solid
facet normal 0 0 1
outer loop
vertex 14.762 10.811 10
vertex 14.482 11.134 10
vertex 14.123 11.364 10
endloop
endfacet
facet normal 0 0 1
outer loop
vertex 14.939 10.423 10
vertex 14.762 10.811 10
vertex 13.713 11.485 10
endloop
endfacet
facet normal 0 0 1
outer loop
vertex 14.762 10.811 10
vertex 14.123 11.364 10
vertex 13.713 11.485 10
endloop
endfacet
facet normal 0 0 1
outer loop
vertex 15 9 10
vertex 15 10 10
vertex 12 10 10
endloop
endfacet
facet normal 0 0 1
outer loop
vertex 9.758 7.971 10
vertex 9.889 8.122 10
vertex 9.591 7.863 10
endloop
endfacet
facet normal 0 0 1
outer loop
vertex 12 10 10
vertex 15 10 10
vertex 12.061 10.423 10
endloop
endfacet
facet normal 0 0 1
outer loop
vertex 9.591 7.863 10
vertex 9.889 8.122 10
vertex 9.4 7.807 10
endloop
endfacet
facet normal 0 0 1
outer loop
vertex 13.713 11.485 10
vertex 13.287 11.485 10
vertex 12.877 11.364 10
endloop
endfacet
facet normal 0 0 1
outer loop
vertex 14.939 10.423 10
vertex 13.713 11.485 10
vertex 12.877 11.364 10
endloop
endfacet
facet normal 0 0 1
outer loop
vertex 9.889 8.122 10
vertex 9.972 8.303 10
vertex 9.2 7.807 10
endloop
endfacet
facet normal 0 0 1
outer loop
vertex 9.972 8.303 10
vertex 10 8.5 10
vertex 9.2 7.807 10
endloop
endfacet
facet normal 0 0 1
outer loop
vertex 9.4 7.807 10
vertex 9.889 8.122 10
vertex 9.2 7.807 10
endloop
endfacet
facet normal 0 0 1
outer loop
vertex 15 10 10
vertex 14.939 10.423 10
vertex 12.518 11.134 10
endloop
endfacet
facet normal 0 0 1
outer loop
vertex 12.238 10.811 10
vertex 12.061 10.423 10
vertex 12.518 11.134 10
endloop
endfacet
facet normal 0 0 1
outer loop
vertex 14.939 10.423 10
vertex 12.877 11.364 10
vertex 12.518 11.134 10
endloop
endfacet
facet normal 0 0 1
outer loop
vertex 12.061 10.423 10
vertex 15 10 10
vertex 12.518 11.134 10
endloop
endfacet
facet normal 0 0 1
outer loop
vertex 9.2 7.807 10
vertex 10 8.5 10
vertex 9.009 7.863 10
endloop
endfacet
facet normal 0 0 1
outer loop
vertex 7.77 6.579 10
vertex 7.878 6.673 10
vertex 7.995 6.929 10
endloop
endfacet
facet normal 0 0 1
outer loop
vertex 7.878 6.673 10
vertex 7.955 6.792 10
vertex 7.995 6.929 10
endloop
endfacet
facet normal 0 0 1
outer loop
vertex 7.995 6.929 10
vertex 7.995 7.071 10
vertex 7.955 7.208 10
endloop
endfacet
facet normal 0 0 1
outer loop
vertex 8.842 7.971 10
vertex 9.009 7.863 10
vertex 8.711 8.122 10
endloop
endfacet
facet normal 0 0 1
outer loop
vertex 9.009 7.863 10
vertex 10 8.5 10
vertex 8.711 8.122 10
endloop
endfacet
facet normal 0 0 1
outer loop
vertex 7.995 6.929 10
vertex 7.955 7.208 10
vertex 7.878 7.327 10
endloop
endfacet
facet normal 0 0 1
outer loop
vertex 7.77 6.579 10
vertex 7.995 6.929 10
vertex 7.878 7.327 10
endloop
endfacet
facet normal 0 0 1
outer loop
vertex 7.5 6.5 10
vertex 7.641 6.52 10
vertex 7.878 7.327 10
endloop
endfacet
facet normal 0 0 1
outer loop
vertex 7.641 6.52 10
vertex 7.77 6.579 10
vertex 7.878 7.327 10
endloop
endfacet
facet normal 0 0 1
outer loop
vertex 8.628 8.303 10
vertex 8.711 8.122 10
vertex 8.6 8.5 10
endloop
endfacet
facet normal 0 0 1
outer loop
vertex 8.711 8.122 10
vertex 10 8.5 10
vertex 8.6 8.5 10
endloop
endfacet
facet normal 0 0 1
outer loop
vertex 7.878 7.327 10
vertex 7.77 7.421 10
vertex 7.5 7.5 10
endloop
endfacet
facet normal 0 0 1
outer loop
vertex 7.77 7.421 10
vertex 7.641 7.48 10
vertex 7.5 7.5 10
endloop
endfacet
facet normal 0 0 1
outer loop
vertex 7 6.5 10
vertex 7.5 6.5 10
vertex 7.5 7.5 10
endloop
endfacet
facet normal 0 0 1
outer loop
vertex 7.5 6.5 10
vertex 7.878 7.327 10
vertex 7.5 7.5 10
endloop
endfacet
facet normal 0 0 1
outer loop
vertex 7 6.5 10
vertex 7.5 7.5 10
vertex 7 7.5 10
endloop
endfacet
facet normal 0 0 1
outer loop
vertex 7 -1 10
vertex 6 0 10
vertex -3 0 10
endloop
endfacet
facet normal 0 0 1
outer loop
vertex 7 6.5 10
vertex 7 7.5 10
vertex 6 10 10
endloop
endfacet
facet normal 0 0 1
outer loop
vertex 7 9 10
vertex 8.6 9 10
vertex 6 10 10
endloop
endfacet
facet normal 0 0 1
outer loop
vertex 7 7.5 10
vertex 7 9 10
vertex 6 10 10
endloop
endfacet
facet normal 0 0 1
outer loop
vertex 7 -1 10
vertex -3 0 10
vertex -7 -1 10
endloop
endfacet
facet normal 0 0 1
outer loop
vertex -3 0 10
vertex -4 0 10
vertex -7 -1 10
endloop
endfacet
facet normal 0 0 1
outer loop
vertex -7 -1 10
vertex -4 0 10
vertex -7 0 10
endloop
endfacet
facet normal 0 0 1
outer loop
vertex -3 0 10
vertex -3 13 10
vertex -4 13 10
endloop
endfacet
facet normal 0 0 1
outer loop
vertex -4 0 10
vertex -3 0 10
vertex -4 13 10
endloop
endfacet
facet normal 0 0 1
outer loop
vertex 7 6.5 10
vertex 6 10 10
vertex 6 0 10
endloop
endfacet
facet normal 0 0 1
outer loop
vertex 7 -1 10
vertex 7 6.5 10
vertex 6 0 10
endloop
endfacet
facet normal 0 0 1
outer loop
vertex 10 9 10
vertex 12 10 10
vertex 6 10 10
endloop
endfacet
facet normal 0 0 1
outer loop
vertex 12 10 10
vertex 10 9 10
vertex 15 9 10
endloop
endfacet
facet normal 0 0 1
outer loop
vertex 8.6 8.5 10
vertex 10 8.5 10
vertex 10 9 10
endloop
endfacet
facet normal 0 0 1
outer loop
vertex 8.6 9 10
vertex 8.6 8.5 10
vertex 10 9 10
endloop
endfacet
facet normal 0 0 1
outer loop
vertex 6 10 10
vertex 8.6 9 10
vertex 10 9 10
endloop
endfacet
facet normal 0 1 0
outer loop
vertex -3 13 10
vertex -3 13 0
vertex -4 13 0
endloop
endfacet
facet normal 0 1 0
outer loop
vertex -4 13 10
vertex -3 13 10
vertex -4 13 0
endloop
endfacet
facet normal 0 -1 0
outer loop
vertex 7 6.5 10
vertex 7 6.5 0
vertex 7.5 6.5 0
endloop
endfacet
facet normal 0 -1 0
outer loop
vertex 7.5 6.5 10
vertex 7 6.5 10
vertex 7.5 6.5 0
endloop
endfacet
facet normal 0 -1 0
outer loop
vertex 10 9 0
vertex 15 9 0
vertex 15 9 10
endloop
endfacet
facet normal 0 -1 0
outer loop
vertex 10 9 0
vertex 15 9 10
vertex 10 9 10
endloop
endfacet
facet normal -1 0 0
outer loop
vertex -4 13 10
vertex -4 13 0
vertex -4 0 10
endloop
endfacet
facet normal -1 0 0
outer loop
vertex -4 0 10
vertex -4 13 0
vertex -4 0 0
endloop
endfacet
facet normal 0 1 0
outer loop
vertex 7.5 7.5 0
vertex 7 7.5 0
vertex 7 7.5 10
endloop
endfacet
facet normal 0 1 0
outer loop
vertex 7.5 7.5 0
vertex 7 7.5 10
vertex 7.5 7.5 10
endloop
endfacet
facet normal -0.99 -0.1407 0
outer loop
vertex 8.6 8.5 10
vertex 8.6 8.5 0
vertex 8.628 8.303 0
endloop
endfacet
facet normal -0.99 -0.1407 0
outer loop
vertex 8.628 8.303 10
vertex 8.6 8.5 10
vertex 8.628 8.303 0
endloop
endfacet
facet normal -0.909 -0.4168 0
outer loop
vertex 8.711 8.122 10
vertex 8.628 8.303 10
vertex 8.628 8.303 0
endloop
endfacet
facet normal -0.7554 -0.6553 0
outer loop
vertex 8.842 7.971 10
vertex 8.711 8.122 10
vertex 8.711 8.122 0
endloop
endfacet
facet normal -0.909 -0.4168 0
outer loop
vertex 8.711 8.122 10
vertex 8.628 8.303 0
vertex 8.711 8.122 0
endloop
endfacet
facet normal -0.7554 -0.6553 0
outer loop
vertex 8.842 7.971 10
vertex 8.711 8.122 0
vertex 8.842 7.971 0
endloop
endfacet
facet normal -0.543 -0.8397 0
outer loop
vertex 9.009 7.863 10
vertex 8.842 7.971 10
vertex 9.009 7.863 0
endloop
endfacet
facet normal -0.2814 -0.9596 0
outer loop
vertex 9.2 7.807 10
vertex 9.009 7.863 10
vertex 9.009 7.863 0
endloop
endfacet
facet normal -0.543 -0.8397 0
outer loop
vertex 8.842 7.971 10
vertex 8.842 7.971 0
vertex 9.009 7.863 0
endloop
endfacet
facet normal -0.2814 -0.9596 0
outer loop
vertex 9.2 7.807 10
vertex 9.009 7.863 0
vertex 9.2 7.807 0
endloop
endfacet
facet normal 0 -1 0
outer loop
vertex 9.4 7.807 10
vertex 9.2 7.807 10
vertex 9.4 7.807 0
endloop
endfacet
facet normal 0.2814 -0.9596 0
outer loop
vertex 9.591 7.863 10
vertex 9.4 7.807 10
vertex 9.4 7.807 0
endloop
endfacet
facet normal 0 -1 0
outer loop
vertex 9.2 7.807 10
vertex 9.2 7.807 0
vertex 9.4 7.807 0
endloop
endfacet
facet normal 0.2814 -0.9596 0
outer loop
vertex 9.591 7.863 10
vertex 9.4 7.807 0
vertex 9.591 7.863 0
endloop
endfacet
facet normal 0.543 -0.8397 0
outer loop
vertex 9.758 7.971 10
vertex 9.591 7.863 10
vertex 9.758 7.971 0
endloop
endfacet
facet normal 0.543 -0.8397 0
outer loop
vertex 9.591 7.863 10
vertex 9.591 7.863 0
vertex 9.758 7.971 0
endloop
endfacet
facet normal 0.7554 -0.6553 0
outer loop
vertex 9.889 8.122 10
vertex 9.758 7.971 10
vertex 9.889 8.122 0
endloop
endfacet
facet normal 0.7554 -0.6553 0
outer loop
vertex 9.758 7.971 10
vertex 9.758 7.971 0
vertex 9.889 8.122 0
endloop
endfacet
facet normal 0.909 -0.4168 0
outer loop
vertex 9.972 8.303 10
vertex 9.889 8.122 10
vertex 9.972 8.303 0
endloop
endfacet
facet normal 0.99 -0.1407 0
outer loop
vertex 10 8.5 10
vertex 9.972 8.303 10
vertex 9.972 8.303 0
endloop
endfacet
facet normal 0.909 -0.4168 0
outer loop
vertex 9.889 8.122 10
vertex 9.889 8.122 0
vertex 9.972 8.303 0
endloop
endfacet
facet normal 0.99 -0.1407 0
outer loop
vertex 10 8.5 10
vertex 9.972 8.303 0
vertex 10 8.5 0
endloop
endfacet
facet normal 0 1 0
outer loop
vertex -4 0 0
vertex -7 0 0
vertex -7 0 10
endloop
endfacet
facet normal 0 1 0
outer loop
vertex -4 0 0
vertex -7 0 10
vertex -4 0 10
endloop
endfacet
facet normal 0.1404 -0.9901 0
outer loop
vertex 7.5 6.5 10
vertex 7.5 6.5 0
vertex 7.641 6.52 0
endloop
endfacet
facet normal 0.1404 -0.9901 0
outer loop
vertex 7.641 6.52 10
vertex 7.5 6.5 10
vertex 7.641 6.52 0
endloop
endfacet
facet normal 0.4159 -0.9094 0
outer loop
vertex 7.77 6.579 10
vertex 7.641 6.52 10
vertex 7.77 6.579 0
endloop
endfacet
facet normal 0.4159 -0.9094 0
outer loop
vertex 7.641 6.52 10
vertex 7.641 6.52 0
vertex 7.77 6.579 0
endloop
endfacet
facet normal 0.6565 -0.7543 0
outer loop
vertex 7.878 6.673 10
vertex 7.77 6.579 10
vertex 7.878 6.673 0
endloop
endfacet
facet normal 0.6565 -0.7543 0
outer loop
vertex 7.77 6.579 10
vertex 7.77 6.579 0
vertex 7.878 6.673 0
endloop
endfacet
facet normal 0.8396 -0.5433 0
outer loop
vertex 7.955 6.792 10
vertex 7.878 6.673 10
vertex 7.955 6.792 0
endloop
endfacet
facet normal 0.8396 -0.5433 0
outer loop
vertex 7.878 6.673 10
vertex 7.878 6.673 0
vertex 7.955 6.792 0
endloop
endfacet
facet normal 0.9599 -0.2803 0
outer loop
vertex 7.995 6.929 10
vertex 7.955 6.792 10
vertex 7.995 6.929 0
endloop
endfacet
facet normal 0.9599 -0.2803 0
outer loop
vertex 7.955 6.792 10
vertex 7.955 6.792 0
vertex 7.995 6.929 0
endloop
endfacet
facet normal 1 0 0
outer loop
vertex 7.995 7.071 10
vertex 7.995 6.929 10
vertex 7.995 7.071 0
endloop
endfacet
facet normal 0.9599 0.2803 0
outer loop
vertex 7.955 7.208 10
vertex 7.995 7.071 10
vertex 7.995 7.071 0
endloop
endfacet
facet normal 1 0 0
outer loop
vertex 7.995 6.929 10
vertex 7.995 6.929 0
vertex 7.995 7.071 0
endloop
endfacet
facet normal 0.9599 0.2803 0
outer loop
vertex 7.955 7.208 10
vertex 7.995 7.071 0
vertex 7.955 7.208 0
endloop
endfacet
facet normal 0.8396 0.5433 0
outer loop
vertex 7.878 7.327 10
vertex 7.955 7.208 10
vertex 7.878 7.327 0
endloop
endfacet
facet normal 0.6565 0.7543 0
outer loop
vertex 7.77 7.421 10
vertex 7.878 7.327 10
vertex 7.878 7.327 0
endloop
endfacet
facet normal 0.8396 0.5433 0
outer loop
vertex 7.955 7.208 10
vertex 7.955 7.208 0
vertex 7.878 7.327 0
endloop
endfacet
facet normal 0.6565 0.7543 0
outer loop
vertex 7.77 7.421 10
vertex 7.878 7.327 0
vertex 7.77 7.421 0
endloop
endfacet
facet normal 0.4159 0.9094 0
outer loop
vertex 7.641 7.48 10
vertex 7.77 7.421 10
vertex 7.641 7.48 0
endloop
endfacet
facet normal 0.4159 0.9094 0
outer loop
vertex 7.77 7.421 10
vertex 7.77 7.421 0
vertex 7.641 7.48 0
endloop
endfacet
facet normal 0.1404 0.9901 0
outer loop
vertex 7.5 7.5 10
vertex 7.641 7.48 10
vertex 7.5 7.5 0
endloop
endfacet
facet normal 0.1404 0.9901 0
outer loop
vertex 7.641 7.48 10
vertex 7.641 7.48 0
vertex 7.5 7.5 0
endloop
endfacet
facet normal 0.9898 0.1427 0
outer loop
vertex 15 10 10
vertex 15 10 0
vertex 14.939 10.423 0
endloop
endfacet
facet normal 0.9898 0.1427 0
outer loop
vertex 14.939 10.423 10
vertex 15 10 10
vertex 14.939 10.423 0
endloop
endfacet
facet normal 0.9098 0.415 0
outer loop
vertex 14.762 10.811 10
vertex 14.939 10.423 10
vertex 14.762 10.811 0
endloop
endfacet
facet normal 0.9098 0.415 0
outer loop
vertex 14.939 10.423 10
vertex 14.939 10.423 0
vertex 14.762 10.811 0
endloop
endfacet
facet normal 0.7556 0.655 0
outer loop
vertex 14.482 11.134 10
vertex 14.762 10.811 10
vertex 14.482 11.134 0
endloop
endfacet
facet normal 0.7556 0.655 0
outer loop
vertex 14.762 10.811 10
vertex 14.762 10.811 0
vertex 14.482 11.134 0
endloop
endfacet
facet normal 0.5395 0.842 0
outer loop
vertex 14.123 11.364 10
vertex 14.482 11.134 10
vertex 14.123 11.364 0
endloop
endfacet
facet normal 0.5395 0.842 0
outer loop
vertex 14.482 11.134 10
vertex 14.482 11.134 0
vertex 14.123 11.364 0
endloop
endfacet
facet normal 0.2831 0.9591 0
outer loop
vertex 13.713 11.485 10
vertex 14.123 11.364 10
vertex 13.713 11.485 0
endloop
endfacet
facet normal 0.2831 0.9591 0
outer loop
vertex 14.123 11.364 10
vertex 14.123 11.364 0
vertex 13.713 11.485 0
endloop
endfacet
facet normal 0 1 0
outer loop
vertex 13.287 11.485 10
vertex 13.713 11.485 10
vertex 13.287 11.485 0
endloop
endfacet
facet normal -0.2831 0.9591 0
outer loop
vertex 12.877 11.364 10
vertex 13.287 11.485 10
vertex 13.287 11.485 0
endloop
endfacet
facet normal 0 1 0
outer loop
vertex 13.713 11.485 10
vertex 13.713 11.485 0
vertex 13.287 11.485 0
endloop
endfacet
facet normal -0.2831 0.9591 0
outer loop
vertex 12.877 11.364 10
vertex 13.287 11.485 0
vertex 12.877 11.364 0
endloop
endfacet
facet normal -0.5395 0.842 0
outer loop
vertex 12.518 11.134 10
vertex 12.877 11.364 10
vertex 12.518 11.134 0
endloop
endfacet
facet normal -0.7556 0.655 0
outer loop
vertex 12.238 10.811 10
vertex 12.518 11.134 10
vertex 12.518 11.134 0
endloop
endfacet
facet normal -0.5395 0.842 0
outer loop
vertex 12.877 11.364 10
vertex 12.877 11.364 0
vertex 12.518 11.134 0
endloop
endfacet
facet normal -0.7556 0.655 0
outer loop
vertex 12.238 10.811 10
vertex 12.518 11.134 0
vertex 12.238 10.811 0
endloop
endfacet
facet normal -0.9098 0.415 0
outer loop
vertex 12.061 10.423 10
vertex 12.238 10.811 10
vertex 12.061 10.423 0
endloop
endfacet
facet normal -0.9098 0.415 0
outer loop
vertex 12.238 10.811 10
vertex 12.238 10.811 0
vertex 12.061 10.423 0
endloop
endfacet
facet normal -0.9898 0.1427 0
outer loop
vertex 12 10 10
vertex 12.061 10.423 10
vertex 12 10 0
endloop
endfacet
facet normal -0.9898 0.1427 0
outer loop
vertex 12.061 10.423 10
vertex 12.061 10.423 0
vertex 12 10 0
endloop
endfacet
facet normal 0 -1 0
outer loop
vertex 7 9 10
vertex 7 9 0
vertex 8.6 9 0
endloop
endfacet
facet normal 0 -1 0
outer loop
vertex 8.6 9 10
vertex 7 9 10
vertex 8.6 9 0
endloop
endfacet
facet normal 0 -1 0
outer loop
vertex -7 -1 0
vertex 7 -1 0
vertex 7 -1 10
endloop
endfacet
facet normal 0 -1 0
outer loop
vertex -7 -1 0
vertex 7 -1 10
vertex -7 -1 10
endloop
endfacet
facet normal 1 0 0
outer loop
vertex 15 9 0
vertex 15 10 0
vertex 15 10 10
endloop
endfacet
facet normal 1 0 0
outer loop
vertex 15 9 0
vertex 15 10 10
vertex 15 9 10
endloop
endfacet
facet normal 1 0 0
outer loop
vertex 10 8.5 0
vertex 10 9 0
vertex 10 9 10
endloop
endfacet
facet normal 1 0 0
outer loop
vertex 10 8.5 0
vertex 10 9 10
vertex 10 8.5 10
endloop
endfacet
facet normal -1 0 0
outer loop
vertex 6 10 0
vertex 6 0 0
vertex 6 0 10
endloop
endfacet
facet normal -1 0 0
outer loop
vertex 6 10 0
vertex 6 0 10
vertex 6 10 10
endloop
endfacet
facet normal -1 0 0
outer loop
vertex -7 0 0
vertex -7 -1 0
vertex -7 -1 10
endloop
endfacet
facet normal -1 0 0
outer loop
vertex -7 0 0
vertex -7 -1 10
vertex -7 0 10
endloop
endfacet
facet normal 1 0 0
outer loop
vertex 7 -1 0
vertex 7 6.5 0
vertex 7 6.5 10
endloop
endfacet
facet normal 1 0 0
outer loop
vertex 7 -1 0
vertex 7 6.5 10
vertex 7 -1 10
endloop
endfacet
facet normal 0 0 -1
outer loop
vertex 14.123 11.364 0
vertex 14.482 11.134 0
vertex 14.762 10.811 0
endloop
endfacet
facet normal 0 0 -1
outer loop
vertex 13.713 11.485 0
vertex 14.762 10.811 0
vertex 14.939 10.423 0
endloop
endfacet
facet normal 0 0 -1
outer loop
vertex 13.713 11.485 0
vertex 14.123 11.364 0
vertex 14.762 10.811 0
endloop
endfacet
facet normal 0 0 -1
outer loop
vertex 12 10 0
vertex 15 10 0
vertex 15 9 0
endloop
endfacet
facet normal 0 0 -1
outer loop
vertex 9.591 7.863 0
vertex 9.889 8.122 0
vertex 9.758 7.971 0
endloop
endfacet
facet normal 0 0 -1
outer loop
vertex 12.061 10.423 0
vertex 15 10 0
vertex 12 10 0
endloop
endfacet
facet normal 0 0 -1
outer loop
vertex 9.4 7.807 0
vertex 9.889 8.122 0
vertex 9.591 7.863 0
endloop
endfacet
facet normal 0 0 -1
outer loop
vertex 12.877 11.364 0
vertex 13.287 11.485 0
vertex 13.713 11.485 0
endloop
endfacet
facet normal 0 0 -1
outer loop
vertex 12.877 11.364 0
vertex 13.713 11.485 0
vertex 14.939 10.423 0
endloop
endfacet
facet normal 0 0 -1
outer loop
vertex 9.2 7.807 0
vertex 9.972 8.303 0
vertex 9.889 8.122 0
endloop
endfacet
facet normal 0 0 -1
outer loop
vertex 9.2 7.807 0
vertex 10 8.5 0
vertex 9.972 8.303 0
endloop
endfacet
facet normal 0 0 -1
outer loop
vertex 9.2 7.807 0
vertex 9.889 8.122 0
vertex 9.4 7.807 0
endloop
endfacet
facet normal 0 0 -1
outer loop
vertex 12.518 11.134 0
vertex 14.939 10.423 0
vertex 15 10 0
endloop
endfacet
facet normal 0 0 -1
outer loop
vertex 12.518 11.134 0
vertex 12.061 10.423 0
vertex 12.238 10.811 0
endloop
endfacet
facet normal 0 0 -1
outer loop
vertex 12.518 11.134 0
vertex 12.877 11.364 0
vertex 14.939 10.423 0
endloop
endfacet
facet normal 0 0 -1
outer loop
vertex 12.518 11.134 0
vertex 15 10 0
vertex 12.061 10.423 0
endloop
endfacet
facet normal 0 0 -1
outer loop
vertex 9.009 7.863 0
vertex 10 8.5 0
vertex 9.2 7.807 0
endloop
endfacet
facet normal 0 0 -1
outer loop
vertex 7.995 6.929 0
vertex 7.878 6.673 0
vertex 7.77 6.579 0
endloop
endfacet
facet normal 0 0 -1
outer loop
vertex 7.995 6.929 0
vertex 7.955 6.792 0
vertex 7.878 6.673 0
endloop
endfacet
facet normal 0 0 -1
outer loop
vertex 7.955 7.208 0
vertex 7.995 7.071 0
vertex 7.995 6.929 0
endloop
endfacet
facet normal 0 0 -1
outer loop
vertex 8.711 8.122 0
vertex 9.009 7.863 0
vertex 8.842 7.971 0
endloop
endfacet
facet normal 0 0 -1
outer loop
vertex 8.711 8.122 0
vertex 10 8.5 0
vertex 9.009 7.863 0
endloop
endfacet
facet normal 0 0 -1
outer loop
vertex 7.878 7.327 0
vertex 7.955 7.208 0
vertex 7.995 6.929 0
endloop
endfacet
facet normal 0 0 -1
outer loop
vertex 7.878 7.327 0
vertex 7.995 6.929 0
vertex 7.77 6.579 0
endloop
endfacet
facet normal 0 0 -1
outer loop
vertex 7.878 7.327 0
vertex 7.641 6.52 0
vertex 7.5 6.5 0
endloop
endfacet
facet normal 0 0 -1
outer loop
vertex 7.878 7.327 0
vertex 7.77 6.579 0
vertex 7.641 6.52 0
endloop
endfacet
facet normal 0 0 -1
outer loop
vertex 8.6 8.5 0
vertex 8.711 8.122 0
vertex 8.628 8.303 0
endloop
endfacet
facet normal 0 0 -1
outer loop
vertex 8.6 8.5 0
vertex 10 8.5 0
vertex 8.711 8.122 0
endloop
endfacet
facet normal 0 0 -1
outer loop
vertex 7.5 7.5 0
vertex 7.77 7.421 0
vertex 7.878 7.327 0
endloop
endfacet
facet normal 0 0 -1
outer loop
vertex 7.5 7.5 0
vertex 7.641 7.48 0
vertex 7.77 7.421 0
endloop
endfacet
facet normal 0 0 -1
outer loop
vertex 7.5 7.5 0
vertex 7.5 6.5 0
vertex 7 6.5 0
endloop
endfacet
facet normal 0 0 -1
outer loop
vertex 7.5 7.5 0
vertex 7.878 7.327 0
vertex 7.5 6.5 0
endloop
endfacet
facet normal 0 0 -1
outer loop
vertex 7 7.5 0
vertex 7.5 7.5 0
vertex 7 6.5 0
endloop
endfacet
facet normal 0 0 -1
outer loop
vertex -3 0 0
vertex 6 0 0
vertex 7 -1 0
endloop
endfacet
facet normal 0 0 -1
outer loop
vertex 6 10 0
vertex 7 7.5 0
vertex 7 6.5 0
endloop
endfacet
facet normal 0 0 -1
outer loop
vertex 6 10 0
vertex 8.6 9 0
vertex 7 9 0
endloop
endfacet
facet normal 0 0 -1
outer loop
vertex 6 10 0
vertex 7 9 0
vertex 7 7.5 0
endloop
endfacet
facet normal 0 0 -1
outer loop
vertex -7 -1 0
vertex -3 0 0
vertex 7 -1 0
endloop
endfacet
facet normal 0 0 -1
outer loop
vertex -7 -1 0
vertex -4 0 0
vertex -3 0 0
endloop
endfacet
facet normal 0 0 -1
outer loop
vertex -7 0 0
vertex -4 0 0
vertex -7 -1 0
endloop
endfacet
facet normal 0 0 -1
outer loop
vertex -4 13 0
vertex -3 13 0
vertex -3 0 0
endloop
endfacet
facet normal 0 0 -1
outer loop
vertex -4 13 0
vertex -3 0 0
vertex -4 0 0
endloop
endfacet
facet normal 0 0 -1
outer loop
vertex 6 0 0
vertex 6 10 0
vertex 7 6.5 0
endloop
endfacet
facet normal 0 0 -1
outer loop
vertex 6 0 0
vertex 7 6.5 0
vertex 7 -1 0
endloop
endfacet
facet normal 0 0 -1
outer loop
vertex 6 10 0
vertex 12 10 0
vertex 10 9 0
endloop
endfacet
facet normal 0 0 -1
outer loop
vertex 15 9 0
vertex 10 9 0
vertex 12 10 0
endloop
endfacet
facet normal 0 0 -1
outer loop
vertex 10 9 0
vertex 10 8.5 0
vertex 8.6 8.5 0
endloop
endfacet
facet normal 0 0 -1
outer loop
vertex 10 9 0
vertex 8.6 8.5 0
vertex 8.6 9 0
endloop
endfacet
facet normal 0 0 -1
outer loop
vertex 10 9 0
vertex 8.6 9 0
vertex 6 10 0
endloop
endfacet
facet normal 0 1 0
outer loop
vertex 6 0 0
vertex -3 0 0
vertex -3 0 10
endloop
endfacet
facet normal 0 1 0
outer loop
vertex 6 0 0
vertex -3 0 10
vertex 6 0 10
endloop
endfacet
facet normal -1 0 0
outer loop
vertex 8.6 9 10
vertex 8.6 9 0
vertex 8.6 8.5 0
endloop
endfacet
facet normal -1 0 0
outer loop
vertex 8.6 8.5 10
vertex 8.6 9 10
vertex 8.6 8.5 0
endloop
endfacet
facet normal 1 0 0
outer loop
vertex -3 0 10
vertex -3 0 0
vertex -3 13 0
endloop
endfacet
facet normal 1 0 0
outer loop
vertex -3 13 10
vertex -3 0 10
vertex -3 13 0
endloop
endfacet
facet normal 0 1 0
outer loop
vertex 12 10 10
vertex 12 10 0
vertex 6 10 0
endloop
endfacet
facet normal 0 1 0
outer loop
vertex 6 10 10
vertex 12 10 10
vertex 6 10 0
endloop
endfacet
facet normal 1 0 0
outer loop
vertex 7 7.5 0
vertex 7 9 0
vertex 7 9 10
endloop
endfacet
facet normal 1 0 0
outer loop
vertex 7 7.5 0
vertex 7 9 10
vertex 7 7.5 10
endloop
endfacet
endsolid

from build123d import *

# Parameters (mm, degrees)
PAD_DEPTH    = 10
PAD001_DEPTH = 10


with BuildPart() as part:
    # Sketch → Pad (new body)
    with BuildSketch(Plane.XY):
        with BuildLine():
            Line((7, -1), (-7, -1))
            Line((-7, -1), (-7, 0))
            Line((-7, 0), (-4, 0))
            Line((-4, 13), (-4, 0))
            Line((-3, 13), (-4, 13))
            Line((-3, 0), (-3, 13))
            Line((-3, 0), (6, 0))
            Line((6, 0), (6, 10))
            Line((12, 10), (6, 10))
            ThreePointArc((15, 10), (13.5, 11.5), (12, 10))
            Line((15, 10), (15, 9))
            Line((15, 9), (10, 9))
            Line((10, 9), (10, 8.5))
            ThreePointArc((8.6, 8.5), (9.3, 7.8), (10, 8.5))
            Line((8.6, 9), (8.6, 8.5))
            Line((7, 9), (8.6, 9))
            Line((7, 9), (7, 7.5))
            Line((7, 7.5), (7.5, 7.5))
            ThreePointArc((7.5, 6.5), (8, 7), (7.5, 7.5))
            Line((7, 6.5), (7.5, 6.5))
            Line((7, 6.5), (7, -1))
        make_face()
    extrude(amount=PAD_DEPTH)

    # Sketch → Pad001 (join)
    with BuildSketch(Plane.XY):
        with BuildLine():
            Line((7, -1), (-7, -1))
            Line((-7, -1), (-7, 0))
            Line((-7, 0), (-4, 0))
            Line((-4, 13), (-4, 0))
            Line((-3, 13), (-4, 13))
            Line((-3, 0), (-3, 13))
            Line((-3, 0), (6, 0))
            Line((6, 0), (6, 10))
            Line((12, 10), (6, 10))
            ThreePointArc((15, 10), (13.5, 11.5), (12, 10))
            Line((15, 10), (15, 9))
            Line((15, 9), (10, 9))
            Line((10, 9), (10, 8.5))
            ThreePointArc((8.6, 8.5), (9.3, 7.8), (10, 8.5))
            Line((8.6, 9), (8.6, 8.5))
            Line((7, 9), (8.6, 9))
            Line((7, 9), (7, 7.5))
            Line((7, 7.5), (7.5, 7.5))
            ThreePointArc((7.5, 6.5), (8, 7), (7.5, 7.5))
            Line((7, 6.5), (7.5, 6.5))
            Line((7, 6.5), (7, -1))
        make_face()
    extrude(amount=PAD001_DEPTH)


solid = part.part
